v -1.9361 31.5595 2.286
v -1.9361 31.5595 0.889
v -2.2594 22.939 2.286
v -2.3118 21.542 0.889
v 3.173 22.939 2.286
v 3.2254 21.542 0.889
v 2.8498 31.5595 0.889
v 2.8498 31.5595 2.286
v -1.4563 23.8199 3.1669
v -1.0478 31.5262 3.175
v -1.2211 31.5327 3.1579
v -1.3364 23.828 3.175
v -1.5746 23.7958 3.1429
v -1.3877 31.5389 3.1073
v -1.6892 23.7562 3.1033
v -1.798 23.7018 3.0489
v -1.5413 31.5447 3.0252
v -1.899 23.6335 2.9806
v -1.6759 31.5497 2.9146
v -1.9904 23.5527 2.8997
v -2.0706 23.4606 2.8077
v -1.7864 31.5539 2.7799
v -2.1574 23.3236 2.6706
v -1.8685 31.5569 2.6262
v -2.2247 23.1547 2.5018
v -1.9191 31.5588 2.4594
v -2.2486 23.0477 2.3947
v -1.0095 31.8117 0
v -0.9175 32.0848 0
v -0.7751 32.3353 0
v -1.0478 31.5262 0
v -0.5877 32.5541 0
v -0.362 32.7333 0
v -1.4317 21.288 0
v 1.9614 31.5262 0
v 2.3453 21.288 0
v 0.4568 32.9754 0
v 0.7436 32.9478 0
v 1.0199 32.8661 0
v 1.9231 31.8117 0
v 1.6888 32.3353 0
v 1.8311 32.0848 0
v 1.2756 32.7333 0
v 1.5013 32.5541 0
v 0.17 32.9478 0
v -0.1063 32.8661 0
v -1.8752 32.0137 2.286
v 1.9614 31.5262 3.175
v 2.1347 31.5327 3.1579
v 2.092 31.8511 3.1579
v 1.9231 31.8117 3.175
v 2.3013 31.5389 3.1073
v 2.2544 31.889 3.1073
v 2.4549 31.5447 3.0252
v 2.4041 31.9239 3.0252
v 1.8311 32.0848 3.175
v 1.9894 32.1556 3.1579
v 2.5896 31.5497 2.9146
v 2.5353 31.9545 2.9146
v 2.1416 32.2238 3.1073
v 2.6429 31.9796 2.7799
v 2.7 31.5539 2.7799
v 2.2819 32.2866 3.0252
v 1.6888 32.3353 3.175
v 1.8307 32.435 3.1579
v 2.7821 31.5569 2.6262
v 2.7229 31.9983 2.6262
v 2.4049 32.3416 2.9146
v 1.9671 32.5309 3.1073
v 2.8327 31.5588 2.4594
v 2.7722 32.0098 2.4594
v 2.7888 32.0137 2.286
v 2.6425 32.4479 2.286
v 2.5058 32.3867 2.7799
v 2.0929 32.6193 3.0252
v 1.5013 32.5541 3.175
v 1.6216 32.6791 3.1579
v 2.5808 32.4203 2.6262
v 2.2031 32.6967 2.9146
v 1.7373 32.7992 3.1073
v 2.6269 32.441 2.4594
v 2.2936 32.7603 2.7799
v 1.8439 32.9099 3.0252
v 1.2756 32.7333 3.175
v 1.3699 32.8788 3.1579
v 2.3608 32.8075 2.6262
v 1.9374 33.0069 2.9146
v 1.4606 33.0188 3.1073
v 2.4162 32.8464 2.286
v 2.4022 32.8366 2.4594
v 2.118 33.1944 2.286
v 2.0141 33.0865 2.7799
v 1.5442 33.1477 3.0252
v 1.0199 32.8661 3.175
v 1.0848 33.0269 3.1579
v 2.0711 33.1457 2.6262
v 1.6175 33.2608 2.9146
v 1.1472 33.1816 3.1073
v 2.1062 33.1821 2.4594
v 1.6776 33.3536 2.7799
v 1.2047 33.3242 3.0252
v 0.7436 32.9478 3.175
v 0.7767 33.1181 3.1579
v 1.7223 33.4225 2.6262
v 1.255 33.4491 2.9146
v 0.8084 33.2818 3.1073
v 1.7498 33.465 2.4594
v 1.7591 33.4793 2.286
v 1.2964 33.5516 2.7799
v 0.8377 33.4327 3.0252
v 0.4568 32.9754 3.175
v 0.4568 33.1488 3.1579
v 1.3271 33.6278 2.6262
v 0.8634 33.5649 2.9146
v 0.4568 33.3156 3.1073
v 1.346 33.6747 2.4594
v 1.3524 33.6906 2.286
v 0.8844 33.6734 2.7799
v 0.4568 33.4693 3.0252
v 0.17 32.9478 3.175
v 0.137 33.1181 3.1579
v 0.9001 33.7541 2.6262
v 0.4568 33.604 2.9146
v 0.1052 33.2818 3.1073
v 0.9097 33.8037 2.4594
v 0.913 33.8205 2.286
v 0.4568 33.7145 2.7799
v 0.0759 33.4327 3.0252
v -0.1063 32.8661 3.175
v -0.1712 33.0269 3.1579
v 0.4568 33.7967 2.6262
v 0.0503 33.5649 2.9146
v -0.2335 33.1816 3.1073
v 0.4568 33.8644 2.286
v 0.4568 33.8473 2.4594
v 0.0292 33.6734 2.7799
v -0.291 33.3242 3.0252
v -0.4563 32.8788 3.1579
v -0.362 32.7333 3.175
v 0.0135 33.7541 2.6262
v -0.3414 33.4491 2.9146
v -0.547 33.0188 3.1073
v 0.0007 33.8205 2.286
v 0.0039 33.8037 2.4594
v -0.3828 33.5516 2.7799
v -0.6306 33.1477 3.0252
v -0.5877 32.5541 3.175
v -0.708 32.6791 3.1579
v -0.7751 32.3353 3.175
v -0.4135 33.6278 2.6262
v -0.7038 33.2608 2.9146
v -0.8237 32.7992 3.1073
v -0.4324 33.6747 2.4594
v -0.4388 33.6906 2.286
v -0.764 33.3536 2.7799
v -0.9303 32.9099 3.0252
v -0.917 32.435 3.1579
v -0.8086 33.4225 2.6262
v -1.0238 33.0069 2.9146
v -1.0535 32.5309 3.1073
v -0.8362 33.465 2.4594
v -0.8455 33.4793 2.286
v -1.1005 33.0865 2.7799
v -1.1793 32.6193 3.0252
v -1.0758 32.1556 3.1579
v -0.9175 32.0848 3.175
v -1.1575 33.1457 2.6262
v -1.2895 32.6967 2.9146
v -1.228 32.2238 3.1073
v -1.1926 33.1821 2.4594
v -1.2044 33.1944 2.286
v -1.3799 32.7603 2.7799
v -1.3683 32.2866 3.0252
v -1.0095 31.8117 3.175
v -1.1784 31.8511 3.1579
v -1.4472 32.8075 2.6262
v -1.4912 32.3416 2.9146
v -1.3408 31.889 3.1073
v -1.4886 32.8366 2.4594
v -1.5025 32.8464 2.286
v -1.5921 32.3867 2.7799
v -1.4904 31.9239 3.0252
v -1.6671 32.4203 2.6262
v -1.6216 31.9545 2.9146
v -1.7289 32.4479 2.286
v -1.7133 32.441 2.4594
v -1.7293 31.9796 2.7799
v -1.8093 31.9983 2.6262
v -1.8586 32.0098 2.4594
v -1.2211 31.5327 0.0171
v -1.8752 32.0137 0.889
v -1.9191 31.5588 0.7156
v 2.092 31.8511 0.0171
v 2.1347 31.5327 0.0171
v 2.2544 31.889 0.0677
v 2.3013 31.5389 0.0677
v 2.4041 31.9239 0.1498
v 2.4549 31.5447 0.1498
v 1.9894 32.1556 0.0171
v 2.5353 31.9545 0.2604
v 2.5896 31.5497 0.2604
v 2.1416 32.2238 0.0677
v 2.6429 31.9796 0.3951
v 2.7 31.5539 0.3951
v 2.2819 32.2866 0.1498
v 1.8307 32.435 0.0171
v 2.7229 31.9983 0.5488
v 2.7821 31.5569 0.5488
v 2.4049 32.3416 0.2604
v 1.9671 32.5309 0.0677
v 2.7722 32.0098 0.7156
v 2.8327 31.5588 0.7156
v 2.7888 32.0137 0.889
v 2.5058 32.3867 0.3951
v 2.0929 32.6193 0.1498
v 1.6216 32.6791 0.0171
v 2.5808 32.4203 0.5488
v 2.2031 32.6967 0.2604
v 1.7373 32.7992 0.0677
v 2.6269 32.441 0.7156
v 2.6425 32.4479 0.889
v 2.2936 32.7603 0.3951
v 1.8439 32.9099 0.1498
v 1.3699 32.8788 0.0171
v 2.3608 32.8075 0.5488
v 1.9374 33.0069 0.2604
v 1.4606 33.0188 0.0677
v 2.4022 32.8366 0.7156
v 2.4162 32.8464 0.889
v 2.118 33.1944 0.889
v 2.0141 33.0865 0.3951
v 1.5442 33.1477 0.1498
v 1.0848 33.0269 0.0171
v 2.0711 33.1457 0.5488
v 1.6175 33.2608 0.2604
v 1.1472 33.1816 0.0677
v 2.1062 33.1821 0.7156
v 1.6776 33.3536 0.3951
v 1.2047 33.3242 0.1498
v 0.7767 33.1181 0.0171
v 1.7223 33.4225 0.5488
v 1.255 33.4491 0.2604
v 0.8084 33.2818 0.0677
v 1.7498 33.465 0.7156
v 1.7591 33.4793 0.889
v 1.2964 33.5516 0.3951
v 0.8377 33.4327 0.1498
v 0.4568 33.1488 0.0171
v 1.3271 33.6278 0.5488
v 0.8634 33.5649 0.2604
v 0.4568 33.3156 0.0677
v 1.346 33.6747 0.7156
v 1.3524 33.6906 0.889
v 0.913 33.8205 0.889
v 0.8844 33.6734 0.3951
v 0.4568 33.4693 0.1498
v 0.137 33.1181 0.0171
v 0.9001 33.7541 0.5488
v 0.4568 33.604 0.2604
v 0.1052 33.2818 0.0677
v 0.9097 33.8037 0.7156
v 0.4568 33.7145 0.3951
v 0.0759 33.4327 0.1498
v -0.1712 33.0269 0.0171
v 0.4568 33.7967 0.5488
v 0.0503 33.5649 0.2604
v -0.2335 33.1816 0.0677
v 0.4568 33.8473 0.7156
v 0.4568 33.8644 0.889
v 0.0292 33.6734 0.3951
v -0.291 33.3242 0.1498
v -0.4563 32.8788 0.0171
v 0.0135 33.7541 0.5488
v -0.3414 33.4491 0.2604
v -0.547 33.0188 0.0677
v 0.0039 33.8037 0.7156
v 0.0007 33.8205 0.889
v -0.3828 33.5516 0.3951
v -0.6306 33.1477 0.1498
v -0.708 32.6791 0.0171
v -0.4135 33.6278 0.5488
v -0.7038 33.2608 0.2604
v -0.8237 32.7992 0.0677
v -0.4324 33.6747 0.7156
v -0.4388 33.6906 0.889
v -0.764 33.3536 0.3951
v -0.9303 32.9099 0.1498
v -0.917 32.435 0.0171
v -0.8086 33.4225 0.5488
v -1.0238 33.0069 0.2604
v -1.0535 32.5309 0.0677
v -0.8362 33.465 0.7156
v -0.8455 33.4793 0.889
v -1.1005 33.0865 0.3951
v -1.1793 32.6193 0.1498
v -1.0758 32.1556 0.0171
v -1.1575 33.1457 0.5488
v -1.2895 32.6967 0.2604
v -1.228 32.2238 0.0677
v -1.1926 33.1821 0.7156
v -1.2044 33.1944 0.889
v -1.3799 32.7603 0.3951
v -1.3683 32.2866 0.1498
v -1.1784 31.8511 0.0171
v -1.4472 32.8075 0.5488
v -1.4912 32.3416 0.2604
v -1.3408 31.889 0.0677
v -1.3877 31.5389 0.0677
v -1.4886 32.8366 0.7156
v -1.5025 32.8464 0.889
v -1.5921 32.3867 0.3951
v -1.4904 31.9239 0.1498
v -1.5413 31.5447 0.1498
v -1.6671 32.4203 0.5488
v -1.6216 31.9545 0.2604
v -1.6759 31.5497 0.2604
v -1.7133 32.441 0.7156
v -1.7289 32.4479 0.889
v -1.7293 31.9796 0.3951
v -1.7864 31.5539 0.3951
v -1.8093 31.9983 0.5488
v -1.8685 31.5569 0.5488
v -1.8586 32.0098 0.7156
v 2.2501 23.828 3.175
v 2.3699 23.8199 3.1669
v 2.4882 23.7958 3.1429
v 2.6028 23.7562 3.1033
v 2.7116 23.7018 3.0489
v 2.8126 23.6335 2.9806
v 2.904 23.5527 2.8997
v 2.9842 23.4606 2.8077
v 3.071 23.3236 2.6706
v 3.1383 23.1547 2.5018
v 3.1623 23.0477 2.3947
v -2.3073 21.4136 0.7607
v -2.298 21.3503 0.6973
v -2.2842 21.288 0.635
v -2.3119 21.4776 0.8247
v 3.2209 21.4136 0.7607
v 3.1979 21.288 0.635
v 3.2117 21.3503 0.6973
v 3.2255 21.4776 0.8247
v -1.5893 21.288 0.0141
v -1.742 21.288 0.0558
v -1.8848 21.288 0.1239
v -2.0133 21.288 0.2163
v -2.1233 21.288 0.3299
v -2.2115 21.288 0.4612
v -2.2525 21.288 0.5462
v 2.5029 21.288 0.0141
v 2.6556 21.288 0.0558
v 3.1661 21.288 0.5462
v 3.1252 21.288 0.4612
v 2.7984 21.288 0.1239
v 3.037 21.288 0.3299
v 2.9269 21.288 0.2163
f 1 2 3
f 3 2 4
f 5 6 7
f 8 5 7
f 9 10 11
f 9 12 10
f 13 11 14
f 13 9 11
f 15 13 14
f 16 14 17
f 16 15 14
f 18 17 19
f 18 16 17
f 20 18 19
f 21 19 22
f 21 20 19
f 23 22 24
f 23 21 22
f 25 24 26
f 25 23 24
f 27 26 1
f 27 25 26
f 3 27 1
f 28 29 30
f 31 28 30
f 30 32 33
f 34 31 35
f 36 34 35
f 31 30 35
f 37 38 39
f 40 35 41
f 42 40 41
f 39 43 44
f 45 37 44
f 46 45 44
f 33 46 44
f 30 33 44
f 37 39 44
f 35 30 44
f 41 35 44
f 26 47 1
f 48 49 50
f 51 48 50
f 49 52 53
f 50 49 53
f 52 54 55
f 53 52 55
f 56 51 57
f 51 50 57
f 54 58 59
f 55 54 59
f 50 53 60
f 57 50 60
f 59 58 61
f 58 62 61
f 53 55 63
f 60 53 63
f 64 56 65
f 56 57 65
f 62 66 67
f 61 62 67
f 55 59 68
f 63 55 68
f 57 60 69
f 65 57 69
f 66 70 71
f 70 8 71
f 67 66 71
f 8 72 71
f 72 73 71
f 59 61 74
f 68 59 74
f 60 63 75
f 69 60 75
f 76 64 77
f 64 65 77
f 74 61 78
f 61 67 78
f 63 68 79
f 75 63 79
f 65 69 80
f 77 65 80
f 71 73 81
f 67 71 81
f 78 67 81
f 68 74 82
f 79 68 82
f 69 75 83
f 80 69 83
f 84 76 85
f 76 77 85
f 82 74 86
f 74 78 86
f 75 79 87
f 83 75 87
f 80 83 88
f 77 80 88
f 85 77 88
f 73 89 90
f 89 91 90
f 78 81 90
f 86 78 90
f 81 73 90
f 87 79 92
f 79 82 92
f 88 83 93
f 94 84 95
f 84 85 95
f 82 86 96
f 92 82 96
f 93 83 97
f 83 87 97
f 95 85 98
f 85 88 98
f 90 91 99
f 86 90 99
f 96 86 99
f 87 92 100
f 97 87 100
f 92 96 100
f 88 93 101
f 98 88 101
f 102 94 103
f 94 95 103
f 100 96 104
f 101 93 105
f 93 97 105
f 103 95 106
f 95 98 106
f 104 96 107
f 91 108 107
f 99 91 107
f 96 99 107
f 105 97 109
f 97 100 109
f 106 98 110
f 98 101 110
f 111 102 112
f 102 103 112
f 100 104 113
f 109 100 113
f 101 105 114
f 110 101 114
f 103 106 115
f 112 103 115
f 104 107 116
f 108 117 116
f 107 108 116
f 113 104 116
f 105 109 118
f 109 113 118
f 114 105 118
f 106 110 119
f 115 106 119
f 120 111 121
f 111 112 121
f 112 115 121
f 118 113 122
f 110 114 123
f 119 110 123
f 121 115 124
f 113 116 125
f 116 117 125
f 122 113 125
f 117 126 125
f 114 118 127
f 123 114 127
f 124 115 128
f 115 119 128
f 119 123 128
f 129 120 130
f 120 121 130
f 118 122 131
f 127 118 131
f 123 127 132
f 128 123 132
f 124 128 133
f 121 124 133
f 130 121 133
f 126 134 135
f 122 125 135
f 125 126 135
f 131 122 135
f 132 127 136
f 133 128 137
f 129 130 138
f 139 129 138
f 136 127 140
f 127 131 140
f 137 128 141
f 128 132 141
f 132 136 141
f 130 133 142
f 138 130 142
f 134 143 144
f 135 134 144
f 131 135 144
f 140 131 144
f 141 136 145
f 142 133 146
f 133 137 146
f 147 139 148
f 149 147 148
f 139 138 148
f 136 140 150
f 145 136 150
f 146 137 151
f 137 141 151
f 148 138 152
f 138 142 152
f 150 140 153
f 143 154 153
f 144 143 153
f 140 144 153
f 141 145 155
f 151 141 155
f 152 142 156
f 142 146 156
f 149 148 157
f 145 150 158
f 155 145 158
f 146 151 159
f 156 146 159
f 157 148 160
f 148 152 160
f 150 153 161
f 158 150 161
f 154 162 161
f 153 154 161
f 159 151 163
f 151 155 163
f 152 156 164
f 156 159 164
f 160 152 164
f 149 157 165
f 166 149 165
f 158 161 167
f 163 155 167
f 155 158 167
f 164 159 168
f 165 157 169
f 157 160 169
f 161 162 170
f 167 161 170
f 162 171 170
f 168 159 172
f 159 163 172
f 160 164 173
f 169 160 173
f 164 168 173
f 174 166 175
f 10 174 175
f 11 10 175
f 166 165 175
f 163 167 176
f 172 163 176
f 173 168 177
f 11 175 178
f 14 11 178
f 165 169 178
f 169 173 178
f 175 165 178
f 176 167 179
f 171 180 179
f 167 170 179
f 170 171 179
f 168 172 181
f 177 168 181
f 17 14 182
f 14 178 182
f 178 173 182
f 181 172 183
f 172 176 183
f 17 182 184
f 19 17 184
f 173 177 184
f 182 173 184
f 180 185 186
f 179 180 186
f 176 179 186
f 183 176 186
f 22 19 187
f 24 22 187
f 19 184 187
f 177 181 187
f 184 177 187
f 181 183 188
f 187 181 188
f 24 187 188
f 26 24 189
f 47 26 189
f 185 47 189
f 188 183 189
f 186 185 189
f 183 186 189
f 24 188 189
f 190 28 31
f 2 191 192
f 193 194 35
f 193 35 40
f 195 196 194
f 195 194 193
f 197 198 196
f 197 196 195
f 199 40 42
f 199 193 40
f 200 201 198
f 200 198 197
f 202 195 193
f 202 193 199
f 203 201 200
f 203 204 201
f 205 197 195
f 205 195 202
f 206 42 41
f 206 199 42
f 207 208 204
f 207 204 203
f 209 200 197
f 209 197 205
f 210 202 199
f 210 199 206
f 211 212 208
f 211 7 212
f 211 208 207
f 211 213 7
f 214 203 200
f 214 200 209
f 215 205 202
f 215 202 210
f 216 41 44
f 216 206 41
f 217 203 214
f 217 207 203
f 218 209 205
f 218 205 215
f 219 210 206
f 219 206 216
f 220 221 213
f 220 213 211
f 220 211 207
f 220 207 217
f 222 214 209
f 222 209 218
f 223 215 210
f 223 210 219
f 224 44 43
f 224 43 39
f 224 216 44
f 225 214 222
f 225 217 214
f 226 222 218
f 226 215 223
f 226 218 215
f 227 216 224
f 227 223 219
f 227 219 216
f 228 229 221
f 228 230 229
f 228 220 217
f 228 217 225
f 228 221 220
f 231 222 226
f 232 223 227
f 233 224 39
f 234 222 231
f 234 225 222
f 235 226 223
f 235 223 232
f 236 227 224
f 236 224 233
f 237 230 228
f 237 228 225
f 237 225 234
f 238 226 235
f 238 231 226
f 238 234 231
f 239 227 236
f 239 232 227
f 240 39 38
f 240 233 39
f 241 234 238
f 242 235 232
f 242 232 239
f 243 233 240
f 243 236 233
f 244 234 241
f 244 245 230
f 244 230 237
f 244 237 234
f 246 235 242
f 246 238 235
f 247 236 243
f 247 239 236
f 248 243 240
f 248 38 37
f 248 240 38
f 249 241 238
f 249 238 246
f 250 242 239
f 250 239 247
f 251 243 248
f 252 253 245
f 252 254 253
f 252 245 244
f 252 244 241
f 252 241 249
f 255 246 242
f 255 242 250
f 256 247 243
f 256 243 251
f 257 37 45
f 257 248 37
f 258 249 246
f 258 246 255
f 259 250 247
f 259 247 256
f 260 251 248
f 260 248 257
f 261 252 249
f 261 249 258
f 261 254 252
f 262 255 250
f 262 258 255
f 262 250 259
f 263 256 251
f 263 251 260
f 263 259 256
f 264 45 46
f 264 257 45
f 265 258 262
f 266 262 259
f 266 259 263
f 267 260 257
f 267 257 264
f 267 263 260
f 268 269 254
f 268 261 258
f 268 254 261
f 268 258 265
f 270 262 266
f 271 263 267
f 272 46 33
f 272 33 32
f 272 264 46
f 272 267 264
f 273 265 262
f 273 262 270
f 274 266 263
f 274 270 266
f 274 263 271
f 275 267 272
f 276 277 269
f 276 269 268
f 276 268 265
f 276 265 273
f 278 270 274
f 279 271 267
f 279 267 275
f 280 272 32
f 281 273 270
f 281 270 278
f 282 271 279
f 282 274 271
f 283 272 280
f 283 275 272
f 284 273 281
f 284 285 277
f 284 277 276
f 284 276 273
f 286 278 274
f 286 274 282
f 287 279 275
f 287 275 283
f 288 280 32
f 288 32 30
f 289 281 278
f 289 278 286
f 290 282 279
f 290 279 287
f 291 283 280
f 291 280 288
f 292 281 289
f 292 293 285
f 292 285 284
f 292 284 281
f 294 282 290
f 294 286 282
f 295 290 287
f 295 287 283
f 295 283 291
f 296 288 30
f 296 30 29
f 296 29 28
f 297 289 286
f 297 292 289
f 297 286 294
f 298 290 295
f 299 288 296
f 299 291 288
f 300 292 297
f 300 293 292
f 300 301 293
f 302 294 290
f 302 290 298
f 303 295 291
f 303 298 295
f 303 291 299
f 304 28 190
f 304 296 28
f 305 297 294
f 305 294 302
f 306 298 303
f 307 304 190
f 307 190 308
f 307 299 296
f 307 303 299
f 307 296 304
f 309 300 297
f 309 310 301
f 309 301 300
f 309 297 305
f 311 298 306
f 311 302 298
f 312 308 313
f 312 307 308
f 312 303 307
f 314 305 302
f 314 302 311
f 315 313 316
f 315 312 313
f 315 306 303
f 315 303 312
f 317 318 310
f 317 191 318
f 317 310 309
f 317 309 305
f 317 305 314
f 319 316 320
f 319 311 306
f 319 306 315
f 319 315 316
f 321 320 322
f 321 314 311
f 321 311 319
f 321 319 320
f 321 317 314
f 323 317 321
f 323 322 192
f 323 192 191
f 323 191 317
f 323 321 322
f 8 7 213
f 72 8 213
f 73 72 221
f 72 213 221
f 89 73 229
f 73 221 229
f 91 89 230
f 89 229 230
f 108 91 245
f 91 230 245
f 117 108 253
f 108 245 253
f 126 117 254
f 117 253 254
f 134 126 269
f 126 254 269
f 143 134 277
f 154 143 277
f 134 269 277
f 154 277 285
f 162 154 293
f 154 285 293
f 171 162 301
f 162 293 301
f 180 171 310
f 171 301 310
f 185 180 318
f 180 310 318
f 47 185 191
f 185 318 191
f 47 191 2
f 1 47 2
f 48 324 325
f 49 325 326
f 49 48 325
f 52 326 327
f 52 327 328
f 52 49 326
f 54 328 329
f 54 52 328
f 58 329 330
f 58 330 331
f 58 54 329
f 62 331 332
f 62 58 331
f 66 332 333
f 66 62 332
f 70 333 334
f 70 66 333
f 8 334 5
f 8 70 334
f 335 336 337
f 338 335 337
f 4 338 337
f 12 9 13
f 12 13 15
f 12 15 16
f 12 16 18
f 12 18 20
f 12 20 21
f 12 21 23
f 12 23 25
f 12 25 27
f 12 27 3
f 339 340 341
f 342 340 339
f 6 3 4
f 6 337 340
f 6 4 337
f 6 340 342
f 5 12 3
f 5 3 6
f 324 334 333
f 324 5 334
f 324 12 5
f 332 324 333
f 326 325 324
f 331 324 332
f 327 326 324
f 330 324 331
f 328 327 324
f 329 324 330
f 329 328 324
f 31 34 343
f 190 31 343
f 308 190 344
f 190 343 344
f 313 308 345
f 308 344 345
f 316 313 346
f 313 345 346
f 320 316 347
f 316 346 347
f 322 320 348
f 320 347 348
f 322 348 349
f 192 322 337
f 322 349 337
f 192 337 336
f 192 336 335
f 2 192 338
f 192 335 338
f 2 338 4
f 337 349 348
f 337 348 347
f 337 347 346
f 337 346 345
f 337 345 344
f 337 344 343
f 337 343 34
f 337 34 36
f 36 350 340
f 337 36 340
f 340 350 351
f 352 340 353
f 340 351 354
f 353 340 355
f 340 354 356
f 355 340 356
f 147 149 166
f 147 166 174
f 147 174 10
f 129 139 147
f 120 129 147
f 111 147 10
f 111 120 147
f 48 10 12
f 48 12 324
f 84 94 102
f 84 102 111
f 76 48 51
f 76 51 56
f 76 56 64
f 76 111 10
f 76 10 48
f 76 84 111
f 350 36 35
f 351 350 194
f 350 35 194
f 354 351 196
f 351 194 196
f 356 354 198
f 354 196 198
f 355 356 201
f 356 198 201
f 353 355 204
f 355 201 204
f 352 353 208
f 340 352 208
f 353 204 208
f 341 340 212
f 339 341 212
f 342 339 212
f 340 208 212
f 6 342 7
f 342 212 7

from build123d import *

# Parameters (mm, degrees)
F1_DEPTH = 3.175
F2_SIZE  = 2.54
F3_R     = 0.889


with BuildPart() as f1:
    # F0 (on Top) → F1 (new body)
    with BuildSketch(Plane.XY):
        with BuildLine():
            Line((3.23494, 21.287959), (2.849758, 31.559478))
            ThreePointArc((2.849758, 31.559478), (0.456815, 33.864368), (-1.936128, 31.559478))
            Line((-1.936128, 31.559478), (-2.32131, 21.287959))
            Line((-2.32131, 21.287959), (3.23494, 21.287959))
        make_face()
    extrude(amount=F1_DEPTH)

    # F2
    f2_edges = [f1.edges().sort_by_distance(p)[0] for p in [
        (0.456815, 21.287959, 3.175),
    ]]
    chamfer(f2_edges, length=F2_SIZE)

    # F3
    f3_edges = [f1.edges().sort_by_distance(p)[0] for p in [
        (-2.081094, 27.693719, 3.175),
        (-2.128719, 26.423719, 0),
    ]]
    fillet(f3_edges, radius=F3_R)


solid = f1.part
